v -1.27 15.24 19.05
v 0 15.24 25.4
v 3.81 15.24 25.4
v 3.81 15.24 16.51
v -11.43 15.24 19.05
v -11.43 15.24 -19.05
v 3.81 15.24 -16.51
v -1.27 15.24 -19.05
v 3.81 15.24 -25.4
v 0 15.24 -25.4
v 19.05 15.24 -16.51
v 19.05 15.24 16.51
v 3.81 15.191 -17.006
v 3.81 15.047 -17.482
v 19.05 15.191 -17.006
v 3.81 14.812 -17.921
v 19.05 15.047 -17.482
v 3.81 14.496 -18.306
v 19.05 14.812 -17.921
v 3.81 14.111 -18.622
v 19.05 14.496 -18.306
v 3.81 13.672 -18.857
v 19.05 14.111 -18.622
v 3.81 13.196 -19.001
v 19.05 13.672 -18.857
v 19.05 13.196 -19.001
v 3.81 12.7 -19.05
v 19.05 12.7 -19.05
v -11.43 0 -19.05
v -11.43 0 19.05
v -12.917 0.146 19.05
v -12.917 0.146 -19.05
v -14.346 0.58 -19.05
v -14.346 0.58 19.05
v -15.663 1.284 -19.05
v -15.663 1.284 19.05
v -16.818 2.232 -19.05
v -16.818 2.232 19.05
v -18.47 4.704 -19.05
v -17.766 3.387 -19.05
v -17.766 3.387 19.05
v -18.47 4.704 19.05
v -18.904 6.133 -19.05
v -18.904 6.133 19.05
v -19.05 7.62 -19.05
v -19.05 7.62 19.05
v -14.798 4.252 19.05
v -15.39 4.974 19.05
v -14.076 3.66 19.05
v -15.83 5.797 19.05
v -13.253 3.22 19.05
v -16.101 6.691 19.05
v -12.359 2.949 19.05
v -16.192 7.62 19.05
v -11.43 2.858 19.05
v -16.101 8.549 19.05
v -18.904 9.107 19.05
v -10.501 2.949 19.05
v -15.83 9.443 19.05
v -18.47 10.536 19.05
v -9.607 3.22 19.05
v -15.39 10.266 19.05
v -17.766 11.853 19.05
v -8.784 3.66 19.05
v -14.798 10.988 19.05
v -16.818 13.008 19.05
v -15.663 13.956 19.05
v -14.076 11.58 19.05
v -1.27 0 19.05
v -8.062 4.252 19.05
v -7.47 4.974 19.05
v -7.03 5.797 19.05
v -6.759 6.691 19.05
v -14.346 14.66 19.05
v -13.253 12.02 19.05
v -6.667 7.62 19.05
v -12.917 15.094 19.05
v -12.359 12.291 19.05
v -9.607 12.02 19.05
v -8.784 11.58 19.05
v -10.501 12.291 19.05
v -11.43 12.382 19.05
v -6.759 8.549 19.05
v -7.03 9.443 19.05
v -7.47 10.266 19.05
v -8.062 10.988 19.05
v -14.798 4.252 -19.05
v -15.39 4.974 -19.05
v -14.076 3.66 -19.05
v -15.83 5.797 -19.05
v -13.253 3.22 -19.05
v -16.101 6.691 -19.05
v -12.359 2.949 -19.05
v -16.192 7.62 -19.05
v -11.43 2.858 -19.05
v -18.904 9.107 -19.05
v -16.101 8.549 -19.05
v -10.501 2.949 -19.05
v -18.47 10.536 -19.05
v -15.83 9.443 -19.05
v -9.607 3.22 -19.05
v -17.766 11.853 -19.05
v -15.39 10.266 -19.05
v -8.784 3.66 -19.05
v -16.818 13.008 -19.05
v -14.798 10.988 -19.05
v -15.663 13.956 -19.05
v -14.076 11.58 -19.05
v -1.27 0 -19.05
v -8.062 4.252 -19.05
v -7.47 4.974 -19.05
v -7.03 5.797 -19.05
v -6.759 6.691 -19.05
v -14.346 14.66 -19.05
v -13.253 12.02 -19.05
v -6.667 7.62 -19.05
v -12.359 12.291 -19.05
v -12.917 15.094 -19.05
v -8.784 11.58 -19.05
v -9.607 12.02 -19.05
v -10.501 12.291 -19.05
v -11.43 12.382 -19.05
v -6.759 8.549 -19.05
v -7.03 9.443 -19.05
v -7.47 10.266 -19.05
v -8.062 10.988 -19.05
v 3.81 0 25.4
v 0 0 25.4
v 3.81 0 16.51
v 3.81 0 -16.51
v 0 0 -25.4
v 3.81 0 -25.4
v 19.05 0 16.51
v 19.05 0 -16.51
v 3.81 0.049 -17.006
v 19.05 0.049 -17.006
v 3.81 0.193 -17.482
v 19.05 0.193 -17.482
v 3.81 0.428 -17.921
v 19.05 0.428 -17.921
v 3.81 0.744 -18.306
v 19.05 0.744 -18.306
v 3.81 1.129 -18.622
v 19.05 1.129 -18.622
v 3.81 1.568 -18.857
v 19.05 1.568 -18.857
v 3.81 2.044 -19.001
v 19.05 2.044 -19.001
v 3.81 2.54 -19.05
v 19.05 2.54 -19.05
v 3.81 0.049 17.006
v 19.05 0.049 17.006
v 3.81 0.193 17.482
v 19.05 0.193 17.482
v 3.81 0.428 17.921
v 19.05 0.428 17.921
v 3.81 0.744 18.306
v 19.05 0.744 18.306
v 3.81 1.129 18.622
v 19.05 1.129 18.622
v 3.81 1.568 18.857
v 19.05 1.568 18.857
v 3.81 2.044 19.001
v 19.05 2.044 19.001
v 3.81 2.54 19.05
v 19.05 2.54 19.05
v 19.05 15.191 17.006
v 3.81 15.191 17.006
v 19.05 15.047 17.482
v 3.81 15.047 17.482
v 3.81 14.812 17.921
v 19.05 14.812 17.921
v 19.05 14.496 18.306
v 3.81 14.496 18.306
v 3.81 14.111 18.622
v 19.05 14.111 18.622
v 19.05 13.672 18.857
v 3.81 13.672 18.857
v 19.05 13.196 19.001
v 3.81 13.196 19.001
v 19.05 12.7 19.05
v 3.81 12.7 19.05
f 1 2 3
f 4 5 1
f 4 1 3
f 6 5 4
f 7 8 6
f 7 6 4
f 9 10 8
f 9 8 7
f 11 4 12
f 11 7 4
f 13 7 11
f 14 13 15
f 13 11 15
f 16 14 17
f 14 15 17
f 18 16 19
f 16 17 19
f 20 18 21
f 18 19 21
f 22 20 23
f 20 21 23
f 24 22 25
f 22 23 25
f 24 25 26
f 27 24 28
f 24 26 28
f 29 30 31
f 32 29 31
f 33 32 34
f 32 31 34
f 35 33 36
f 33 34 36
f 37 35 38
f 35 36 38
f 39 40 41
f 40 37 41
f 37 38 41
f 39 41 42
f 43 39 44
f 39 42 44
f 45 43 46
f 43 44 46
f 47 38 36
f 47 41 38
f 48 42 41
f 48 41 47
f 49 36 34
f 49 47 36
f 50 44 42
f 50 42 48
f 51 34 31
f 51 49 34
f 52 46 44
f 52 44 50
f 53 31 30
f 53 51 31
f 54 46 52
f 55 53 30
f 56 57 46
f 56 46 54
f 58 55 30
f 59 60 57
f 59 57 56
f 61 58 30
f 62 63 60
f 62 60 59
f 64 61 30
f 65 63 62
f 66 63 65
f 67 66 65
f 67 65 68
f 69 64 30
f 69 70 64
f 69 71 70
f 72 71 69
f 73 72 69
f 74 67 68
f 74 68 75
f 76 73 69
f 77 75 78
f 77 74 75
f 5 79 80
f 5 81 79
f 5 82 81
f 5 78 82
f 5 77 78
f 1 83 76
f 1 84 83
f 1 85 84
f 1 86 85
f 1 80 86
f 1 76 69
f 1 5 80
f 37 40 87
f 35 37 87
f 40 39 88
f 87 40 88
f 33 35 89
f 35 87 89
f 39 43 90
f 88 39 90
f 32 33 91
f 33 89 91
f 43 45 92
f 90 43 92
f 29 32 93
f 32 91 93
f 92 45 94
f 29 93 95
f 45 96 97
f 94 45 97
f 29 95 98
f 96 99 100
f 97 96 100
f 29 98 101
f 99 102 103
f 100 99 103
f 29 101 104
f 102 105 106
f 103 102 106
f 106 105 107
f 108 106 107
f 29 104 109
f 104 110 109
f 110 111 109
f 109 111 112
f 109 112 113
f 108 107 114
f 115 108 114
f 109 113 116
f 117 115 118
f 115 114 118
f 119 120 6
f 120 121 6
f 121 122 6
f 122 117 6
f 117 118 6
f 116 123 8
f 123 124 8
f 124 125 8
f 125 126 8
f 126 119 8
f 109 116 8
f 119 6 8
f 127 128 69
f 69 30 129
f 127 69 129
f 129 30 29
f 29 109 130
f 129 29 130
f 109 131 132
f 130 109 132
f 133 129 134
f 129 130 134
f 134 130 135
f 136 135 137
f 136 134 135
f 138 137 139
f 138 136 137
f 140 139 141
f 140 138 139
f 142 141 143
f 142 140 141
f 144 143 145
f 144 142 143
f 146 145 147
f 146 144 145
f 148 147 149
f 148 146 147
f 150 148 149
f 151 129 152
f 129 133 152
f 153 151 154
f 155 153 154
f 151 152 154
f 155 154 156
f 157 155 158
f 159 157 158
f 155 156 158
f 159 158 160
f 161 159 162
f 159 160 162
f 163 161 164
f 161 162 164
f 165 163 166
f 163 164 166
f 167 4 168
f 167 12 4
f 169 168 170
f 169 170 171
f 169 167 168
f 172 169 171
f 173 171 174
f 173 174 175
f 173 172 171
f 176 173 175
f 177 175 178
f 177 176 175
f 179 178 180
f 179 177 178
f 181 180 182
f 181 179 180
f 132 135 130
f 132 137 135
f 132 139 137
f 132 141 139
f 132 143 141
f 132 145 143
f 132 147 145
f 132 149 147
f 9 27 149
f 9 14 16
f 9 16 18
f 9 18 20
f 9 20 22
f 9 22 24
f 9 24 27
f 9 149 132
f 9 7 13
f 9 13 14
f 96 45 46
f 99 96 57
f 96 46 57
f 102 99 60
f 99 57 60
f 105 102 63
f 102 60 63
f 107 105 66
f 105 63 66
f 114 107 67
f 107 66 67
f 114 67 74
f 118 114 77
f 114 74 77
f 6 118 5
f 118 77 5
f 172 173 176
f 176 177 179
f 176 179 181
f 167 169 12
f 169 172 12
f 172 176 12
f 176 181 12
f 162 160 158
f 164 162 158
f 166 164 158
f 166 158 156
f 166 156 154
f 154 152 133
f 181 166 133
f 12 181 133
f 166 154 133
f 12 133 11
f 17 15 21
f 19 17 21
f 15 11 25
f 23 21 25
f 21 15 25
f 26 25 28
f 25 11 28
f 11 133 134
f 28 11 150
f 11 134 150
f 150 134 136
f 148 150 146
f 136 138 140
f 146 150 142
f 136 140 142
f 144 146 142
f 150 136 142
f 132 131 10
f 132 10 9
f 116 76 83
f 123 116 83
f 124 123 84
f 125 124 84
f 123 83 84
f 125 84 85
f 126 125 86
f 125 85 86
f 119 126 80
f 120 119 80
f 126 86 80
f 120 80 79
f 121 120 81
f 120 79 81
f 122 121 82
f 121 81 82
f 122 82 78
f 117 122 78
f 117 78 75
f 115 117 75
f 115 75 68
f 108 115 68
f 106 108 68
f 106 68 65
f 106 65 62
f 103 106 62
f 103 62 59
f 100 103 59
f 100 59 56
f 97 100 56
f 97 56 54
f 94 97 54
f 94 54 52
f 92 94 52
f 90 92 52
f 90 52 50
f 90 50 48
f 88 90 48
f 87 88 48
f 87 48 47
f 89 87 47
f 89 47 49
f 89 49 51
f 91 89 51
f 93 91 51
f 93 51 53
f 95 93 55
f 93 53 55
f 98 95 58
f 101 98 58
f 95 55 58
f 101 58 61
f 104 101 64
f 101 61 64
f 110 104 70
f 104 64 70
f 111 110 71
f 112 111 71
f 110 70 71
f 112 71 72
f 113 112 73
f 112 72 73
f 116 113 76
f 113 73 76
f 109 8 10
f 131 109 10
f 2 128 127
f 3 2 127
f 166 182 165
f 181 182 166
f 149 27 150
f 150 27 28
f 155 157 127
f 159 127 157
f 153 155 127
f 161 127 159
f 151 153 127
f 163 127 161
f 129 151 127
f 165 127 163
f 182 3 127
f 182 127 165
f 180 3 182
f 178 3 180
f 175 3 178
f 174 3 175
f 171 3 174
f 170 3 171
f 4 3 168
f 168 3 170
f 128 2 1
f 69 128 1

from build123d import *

# Parameters (mm, degrees)
SKETCH1_W           = 38.1
SKETCH1_H           = 50.8
BOSS_EXTRUDE1_DEPTH = 15.24
SKETCH2_W           = 17.78
SKETCH2_H           = 6.35
SKETCH2_W_2         = 15.24
CUT_EXTRUDE1_DEPTH  = 15.24
SKETCH3_R           = 4.7625
CUT_EXTRUDE2_DEPTH  = 45.45
FILLET1_R           = 2.54


with BuildPart() as part:
    # Sketch1 → Boss-Extrude1 (new body)
    with BuildSketch(Plane(origin=(0, 0, 0), x_dir=(1, 0, 0), z_dir=(0, 1, 0))):
        Rectangle(SKETCH1_W, SKETCH1_H)
    extrude(amount=BOSS_EXTRUDE1_DEPTH)

    # Sketch2 → Cut-Extrude1 (cut)
    with BuildSketch(Plane(origin=(0, 15.24, 0), x_dir=(1, 0, 0), z_dir=(0, 1, 0))):
        with Locations((-10.16, 22.225)):
            Rectangle(SKETCH2_W, SKETCH2_H)
        with Locations((11.43, 22.225)):
            Rectangle(SKETCH2_W_2, SKETCH2_H)
        with Locations((-10.16, -22.225)):
            Rectangle(SKETCH2_W, SKETCH2_H)
        with Locations((11.43, -22.225)):
            Rectangle(SKETCH2_W_2, SKETCH2_H)
        Polygon((0, -25.4), (-1.27, -19.05), (-1.27, -25.4), align=None)
        Polygon((0, 25.4), (-1.27, 25.4), (-1.27, 19.05), align=None)
    extrude(amount=-CUT_EXTRUDE1_DEPTH, mode=Mode.SUBTRACT)

    # Sketch3 → Cut-Extrude2 (cut, through all)
    with BuildSketch(Plane.XY.offset(19.05)):
        with BuildLine():
            ThreePointArc((-19.05, 7.62), (-16.818153673, 13.008153673), (-11.43, 15.24))
            Line((-11.43, 15.24), (-19.05, 15.24))
            Line((-19.05, 15.24), (-19.05, 7.62))
        make_face()
        with BuildLine():
            ThreePointArc((-11.43, 0), (-16.818153673, 2.231846327), (-19.05, 7.62))
            Line((-19.05, 7.62), (-19.05, 0))
            Line((-19.05, 0), (-11.43, 0))
        make_face()
        with Locations((-11.43, 7.62)):
            Circle(SKETCH3_R)
    extrude(amount=-CUT_EXTRUDE2_DEPTH, mode=Mode.SUBTRACT)

    # Fillet1
    fillet1_edges = [part.edges().sort_by_distance(p)[0] for p in [
        (11.43, 15.24, 19.05),
        (11.43, 0, 19.05),
        (11.43, 0, -19.05),
        (11.43, 15.24, -19.05),
    ]]
    fillet(fillet1_edges, radius=FILLET1_R)


solid = part.part
